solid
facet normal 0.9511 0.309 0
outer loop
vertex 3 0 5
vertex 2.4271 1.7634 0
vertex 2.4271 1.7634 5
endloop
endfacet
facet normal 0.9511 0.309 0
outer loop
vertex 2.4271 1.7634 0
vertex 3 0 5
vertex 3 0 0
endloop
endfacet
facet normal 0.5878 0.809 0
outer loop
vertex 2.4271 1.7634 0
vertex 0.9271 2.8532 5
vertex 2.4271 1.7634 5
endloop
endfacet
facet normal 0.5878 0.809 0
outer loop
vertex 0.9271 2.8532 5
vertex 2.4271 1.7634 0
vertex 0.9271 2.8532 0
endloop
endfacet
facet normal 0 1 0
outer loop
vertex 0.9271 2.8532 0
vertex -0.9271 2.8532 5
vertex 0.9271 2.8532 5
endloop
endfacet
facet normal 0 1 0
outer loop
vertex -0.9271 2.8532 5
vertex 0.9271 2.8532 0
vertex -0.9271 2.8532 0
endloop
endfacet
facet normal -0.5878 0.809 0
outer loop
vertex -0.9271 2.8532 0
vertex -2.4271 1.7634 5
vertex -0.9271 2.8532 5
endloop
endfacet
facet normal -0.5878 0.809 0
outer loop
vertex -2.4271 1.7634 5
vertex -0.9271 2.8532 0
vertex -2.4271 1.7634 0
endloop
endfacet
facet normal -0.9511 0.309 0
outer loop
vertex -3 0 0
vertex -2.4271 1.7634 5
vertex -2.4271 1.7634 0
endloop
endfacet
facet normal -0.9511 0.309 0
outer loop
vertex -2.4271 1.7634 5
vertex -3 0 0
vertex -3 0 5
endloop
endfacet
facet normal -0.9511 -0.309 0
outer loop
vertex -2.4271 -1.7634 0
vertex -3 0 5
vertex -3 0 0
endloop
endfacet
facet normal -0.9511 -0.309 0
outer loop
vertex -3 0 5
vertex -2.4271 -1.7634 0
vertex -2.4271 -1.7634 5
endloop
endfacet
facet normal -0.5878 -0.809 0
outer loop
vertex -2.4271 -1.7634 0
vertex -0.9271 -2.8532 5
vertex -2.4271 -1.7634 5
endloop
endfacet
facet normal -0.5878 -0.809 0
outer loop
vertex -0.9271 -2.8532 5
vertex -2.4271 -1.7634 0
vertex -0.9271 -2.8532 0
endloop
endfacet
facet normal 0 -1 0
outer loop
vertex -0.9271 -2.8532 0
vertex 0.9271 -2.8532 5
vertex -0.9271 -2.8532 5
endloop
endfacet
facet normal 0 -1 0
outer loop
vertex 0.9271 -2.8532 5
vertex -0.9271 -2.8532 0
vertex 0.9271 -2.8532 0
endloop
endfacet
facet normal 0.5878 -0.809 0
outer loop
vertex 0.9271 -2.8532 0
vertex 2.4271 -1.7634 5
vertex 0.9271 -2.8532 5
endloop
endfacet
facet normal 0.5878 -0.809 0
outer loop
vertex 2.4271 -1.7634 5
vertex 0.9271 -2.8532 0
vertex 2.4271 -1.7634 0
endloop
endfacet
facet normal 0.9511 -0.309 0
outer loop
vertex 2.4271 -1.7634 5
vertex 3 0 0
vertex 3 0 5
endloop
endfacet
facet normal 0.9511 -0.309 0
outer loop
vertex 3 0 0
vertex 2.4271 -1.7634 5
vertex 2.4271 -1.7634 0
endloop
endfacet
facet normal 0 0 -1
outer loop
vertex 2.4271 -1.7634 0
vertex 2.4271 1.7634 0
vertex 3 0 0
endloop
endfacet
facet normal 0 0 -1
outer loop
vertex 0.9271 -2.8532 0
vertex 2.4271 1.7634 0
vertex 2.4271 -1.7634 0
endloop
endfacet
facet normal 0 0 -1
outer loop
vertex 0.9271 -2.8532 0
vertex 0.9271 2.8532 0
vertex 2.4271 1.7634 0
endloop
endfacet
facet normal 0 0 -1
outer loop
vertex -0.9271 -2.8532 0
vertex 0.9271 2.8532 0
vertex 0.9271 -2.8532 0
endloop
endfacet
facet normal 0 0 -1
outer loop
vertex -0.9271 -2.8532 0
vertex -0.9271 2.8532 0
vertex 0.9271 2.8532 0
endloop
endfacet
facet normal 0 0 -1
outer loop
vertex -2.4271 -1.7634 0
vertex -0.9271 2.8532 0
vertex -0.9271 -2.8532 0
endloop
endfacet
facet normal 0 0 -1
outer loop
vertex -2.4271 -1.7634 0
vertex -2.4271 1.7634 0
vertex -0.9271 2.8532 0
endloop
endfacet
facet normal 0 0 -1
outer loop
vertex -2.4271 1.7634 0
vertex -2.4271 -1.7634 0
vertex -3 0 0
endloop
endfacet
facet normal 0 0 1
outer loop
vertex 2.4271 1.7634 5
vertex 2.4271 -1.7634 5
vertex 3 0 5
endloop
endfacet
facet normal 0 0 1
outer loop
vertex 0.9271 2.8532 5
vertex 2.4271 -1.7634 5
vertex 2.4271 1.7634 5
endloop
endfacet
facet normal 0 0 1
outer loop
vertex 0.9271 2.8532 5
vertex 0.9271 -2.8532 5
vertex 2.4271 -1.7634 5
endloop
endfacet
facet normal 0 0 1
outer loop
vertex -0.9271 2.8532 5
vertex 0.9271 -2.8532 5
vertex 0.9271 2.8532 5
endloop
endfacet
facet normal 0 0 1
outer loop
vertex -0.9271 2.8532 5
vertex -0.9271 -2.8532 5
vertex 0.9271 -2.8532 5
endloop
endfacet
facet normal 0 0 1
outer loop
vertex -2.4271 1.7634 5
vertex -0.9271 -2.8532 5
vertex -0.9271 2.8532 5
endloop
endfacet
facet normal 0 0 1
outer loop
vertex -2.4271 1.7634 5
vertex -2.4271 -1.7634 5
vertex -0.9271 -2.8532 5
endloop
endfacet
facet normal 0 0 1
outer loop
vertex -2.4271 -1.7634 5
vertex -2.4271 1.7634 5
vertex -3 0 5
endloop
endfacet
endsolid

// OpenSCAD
// Generated by SolidPython 1.0.1 on 2020-07-29 00:46:43


cylinder(h = 5, r1 = 3, r2 = 3);
/***********************************************
*********      SolidPython code:      **********
************************************************
 
# import packages: SolidPython
from solid import *
from solid.utils import *
from itertools import chain, combinations, permutations


class Resize:

    def __init__(self, scad_file):
        self.scad_file = scad_file
        #self.scad_file = import_scad(scad_file)
        # cone/cylinder param:
        self.r1 = 0
        self.r2 = 0
        self.h = 0
        # rectangular prism param:
        self.w = 0
        self.l = 0
        # ellipse param:
        self.r = 0

    # import OpenScad code (file name corresponds to shape)


    # classify shape + parameters
    def assign(self, param1, param2, param3):
        if self.scad_file == 'cone.scad':
            self.r1 = param1
            self.r2 = param2
            self.h = param3
        elif self.scad_file == 'cylinder.scad':
            self.r1 = param1
            self.r2 = param2
            self.h = param3
        elif self.scad_file == 'rectangularPrism.scad':
            self.h = param1
            self.l = param2
            self.w = param3
        else:
            self.r = param1
            self.h = param2

    # resize parameters
    def iterate(self):
        x = range(3, 20, 2)
        i = 1
        if self.scad_file == 'cone.scad':
            tempList = list(permutations(x, 2))
            for temp in tempList:
                param1 = temp[0]
                param2 = temp[1]
                filepath = 'produced_scad_files/' + 'cone' + str(param1) + '_' + str(param2) + '_' + '.scad'
                scad_render_to_file(cylinder(h=param1, r1=param2, r2=0), filepath)

        elif self.scad_file == 'cylinder.scad':
            tempList = list(permutations(x, 3))
            for temp in tempList:
                param1 = temp[0]
                param2 = temp[1]
                filepath = 'produced_scad_files/' + 'cylinder' + str(param1) + '_' + str(param2) + '_' + '.scad'
                scad_render_to_file(cylinder(h=param1, r1=param2, r2=param2), filepath)

        elif self.scad_file == 'rectangularPrism.scad':
            tempList = list(permutations(x, 3))
            for temp in tempList:
                param1 = temp[0]
                param2 = temp[1]
                param3 = temp[2]
                filepath = 'produced_scad_files/' + 'rectangularPrism' + str(param1) + '_' + str(param2) + '_' + str(
                    param3) + '.scad'
                scad_render_to_file(cube(size=(param1, param2, param3)), filepath)

        elif self.scad_file == 'ellipse.scad':
            tempList = list(permutations(x, 4))
            for temp in tempList:
                param1 = temp[0]
                param2 = temp[1]
                param3 = temp[2]
                param4 = temp[3]
                filepath = 'produced_scad_files/' + 'ellipse' + str(param1) + '_' + str(param2) + '_' + str(param3) + '_' + str(param4) + '.scad'
                scad_render_to_file(scale([param1, param2, param3])(sphere(r=param4)), filepath)

    def render_to_scadfile(self):
        scad_render_to_file(scad, 'example.scad') 
 
************************************************/
